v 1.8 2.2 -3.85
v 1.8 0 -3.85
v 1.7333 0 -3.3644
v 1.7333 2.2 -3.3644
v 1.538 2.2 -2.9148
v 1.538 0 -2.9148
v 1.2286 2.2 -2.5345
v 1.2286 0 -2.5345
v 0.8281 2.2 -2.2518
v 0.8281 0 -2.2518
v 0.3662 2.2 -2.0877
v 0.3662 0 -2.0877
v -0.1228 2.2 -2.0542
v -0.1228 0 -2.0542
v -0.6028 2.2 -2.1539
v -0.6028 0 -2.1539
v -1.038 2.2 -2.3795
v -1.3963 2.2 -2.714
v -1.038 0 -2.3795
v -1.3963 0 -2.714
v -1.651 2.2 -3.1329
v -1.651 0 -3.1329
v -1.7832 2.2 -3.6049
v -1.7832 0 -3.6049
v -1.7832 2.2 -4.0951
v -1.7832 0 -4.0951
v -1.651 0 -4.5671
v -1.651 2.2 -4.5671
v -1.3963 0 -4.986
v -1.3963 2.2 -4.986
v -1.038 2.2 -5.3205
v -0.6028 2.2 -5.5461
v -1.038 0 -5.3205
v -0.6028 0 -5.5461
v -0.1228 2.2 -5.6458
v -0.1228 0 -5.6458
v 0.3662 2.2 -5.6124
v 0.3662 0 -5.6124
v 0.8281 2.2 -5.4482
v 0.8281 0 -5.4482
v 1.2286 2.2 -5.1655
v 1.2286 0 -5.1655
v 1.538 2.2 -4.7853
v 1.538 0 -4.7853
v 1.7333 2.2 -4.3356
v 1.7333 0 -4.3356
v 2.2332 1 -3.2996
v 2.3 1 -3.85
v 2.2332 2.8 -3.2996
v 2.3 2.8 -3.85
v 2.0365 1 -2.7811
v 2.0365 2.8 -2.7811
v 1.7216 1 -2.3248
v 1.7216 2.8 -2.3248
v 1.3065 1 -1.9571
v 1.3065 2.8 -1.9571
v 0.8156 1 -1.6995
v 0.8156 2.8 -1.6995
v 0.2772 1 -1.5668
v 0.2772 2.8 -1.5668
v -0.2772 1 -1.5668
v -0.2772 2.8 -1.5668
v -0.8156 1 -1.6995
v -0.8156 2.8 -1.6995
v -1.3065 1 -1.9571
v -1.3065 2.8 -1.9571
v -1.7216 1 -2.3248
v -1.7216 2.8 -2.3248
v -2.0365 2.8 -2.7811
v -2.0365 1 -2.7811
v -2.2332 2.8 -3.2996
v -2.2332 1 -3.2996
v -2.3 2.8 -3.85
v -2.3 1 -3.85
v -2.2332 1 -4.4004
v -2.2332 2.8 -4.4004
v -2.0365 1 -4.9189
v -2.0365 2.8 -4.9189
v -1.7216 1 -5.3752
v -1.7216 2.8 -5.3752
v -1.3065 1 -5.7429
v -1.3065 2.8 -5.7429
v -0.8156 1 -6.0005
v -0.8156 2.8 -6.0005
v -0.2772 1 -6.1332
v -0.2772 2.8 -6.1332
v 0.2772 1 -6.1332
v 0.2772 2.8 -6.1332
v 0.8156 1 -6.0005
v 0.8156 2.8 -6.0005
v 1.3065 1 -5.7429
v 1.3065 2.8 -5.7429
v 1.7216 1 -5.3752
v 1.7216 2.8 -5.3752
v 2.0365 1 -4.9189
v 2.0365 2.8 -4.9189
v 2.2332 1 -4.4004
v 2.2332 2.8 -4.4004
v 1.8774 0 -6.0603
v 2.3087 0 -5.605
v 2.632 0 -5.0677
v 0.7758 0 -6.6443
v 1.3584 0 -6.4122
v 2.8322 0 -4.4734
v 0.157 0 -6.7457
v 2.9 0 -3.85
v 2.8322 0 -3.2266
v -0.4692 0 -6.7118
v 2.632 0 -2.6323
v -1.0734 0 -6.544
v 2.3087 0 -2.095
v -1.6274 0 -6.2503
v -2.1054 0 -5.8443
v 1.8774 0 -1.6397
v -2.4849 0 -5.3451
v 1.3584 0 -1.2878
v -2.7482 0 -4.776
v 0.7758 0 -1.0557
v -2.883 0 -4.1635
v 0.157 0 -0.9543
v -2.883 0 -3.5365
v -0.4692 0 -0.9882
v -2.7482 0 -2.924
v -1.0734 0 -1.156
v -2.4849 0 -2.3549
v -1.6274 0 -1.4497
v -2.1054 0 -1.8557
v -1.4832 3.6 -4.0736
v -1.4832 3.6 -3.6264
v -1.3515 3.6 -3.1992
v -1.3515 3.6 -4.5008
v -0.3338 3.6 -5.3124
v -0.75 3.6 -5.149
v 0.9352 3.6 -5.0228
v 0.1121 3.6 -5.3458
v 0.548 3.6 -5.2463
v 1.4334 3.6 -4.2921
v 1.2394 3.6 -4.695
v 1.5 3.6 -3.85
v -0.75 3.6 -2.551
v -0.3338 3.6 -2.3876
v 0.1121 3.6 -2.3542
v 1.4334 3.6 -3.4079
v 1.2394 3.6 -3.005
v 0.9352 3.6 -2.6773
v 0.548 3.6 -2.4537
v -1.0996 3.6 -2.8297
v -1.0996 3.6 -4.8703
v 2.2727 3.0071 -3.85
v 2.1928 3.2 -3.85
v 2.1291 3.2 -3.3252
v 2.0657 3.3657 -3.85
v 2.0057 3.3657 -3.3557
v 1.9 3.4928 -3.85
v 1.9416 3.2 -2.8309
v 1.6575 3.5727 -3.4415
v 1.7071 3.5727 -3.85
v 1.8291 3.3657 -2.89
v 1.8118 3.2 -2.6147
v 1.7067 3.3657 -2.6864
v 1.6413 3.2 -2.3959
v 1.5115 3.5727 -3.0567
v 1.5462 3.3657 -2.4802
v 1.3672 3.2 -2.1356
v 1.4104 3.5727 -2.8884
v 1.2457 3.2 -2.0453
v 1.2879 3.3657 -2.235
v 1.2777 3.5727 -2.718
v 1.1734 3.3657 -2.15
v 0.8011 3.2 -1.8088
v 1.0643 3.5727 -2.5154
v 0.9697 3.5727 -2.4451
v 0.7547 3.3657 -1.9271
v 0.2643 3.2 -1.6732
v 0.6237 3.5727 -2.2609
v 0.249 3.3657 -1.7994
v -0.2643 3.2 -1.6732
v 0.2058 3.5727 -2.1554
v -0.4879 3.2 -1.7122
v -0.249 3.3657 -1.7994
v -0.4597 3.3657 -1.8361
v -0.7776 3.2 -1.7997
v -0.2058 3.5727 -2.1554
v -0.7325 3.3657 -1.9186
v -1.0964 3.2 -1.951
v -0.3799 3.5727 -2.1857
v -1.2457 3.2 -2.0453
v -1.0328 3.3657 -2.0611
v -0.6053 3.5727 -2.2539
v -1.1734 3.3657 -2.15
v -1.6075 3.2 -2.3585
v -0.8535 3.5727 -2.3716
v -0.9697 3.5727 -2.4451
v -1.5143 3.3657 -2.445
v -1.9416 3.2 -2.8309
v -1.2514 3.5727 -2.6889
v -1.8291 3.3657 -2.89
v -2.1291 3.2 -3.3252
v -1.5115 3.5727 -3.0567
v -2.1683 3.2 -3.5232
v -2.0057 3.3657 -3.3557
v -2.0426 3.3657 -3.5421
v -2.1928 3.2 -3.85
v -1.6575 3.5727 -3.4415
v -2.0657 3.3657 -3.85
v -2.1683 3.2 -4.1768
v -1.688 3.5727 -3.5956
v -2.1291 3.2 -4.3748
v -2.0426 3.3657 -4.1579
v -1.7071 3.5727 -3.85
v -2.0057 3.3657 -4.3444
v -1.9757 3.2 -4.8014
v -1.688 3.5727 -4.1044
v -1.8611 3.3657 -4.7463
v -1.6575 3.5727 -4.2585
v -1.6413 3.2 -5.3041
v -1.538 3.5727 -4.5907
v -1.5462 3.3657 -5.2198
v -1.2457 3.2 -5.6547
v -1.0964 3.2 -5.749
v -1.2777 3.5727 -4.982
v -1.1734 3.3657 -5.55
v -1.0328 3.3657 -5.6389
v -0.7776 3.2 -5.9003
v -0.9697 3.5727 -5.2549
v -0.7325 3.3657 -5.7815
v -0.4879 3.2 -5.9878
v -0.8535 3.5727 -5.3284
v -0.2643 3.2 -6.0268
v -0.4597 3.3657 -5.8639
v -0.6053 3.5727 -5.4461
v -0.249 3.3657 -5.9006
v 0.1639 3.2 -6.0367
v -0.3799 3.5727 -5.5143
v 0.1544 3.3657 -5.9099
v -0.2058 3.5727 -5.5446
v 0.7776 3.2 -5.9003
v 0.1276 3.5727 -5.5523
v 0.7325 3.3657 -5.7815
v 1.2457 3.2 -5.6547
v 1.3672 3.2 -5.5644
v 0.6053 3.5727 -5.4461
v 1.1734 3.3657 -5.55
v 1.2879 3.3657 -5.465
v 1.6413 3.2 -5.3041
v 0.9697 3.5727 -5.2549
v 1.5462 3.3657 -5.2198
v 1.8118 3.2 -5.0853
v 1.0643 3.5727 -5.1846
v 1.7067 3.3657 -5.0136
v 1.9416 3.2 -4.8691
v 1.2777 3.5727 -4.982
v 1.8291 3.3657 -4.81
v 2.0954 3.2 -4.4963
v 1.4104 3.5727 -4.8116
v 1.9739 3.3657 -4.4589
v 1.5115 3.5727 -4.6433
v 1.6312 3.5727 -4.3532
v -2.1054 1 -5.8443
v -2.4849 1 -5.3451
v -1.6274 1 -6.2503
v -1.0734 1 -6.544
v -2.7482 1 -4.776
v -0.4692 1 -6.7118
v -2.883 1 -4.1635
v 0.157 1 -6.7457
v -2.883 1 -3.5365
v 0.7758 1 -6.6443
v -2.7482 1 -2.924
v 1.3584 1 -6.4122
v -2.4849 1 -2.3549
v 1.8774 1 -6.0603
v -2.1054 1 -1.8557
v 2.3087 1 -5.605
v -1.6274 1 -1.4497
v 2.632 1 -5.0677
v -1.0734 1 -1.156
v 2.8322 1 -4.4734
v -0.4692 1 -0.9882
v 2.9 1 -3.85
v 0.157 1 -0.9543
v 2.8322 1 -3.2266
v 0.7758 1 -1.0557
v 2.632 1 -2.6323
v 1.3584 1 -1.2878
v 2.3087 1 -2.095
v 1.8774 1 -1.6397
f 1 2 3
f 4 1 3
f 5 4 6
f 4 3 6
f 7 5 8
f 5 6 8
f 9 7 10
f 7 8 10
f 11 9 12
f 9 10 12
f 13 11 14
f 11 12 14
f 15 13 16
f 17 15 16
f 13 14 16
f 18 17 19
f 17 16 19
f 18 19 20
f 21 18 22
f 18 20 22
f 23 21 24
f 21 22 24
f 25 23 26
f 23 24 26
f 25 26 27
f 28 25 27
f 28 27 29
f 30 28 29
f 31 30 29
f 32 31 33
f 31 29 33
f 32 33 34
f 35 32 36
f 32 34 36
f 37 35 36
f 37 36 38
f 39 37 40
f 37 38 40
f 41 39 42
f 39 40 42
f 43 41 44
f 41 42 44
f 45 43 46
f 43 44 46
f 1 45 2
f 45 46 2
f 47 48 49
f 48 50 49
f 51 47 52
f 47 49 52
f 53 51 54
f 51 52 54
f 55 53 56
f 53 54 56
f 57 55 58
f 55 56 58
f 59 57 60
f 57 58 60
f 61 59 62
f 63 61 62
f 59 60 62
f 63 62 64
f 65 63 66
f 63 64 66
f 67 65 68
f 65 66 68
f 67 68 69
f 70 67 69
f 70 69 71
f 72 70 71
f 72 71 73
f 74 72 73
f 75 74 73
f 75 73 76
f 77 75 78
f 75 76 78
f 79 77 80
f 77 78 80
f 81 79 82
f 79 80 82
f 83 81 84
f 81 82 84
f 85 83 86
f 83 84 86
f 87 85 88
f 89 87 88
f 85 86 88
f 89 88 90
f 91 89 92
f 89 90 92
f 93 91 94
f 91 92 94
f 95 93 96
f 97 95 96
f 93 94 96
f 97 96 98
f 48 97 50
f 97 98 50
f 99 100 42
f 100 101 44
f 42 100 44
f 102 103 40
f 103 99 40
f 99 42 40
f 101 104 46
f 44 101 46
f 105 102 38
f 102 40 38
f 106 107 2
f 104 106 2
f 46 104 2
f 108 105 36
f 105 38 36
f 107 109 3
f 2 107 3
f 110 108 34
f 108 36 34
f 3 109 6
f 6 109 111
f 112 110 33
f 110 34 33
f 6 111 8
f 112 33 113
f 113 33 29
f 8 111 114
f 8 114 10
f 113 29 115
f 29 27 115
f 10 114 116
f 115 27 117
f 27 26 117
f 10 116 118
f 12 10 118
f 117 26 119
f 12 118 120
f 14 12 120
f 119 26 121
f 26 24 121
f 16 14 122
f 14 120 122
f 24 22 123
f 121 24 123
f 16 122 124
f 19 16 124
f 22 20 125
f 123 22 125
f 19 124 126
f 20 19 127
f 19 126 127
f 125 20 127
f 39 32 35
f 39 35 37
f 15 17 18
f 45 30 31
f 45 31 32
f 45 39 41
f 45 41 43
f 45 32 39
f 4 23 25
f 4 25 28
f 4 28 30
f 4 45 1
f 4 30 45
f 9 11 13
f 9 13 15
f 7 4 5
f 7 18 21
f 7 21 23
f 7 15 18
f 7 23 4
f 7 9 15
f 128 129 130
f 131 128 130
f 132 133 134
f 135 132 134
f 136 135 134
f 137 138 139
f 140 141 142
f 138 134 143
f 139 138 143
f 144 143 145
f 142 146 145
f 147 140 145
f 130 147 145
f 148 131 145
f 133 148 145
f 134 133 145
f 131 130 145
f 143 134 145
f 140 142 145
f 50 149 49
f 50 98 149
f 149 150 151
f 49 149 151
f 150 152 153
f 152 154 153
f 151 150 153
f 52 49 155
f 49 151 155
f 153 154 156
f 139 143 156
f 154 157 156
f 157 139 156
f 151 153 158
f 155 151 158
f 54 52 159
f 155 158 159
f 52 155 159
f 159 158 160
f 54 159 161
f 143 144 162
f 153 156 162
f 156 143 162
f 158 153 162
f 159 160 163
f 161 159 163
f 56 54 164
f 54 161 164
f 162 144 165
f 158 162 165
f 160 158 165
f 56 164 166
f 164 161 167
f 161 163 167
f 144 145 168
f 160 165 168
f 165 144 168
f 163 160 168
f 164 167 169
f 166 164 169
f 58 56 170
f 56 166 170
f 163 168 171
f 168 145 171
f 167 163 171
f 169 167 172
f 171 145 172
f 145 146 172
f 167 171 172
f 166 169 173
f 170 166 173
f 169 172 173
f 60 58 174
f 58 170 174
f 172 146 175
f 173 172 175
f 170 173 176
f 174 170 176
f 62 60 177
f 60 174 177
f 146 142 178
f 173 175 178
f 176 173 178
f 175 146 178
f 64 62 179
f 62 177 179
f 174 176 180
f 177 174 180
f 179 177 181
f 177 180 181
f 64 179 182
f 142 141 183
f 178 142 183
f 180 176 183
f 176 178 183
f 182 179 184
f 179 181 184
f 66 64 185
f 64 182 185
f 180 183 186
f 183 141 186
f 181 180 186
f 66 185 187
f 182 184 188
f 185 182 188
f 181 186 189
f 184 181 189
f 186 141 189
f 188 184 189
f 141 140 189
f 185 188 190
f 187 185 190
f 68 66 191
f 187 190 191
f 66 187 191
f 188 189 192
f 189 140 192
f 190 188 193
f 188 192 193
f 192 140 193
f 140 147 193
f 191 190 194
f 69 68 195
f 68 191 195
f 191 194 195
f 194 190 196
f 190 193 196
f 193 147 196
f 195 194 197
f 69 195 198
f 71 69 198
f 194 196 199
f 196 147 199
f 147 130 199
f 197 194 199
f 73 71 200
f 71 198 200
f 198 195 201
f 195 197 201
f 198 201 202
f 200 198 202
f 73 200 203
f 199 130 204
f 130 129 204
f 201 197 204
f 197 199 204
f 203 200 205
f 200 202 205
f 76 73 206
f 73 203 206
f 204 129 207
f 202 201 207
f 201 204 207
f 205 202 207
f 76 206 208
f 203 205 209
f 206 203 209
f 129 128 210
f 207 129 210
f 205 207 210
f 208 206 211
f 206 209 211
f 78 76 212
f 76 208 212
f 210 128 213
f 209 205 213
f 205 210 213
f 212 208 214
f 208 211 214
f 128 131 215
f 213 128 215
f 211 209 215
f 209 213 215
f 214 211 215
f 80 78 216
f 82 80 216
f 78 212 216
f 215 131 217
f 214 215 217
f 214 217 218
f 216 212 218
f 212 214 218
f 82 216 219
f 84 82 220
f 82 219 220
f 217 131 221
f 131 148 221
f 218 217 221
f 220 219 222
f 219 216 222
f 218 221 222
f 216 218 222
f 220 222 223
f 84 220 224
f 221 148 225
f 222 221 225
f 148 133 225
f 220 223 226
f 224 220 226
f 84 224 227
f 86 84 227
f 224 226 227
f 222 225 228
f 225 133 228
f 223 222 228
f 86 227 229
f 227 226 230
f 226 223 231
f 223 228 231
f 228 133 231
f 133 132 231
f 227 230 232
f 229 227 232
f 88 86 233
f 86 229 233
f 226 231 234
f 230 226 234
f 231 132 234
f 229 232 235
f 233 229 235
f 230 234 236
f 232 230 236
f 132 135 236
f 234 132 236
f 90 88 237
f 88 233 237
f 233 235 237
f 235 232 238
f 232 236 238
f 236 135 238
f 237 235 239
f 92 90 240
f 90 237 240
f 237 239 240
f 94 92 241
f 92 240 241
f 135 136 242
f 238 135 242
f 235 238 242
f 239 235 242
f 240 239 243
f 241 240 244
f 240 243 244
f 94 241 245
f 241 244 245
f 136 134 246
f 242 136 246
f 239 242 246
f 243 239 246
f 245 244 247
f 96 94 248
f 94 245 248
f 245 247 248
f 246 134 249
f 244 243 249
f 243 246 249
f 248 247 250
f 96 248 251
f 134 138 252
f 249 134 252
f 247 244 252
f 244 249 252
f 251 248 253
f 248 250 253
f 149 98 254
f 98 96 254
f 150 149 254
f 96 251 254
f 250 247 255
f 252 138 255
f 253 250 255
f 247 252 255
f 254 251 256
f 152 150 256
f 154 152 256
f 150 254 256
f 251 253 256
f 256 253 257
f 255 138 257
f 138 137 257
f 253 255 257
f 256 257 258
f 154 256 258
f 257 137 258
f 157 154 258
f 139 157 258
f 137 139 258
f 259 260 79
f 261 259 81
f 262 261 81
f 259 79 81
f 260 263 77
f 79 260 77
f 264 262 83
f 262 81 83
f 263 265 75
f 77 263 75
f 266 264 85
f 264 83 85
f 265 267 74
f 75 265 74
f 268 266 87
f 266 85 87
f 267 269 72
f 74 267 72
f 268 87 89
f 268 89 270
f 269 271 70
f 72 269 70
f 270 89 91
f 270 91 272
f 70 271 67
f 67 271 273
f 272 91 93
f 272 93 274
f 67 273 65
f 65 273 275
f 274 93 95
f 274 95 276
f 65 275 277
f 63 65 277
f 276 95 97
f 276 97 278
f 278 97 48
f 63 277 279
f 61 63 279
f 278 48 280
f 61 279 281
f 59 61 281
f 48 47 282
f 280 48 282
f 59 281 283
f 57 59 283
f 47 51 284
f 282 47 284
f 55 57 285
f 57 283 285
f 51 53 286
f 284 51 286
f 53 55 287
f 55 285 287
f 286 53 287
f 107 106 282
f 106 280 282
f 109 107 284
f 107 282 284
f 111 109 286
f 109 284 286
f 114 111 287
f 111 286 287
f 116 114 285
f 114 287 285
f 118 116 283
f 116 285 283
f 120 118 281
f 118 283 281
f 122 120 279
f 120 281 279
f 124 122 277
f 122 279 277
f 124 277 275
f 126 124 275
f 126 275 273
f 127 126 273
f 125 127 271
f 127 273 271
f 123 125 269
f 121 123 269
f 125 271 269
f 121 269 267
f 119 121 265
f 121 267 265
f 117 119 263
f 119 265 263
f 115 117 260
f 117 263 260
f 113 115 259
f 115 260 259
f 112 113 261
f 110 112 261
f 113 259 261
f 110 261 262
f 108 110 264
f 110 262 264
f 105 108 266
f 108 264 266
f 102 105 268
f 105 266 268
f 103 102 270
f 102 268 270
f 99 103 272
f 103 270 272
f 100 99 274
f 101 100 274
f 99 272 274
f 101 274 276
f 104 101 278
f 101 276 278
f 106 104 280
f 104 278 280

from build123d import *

# Parameters (mm, degrees)
SKETCH_5_R          = 1.8
CUT_EXTRUDE_1_DEPTH = 2.2


with BuildPart() as part:
    # 草图2 → 旋转1 (revolve)
    with BuildSketch(Plane.XY.offset(-3.85000283)):
        with BuildLine():
            Line((1.5, 3.6), (0, 3.6))
            Line((0, 3.6), (0, 0))
            Line((0, 0), (2.9, 0))
            Line((2.9, 0), (2.9, 1))
            Line((2.9, 1), (2.3, 1))
            Line((2.3, 1), (2.3, 2.8))
            ThreePointArc((2.3, 2.8), (2.065685425, 3.365685425), (1.5, 3.6))
        make_face()
    revolve(axis=Axis((0, 3.6, -3.85000283), (0, -1, 0)))

    # 草图5 → 切除-拉伸1 (cut)
    with BuildSketch(Plane.XZ):
        with Locations((0, -3.85000283)):
            Circle(SKETCH_5_R)
    extrude(amount=-CUT_EXTRUDE_1_DEPTH, mode=Mode.SUBTRACT)


solid = part.part
